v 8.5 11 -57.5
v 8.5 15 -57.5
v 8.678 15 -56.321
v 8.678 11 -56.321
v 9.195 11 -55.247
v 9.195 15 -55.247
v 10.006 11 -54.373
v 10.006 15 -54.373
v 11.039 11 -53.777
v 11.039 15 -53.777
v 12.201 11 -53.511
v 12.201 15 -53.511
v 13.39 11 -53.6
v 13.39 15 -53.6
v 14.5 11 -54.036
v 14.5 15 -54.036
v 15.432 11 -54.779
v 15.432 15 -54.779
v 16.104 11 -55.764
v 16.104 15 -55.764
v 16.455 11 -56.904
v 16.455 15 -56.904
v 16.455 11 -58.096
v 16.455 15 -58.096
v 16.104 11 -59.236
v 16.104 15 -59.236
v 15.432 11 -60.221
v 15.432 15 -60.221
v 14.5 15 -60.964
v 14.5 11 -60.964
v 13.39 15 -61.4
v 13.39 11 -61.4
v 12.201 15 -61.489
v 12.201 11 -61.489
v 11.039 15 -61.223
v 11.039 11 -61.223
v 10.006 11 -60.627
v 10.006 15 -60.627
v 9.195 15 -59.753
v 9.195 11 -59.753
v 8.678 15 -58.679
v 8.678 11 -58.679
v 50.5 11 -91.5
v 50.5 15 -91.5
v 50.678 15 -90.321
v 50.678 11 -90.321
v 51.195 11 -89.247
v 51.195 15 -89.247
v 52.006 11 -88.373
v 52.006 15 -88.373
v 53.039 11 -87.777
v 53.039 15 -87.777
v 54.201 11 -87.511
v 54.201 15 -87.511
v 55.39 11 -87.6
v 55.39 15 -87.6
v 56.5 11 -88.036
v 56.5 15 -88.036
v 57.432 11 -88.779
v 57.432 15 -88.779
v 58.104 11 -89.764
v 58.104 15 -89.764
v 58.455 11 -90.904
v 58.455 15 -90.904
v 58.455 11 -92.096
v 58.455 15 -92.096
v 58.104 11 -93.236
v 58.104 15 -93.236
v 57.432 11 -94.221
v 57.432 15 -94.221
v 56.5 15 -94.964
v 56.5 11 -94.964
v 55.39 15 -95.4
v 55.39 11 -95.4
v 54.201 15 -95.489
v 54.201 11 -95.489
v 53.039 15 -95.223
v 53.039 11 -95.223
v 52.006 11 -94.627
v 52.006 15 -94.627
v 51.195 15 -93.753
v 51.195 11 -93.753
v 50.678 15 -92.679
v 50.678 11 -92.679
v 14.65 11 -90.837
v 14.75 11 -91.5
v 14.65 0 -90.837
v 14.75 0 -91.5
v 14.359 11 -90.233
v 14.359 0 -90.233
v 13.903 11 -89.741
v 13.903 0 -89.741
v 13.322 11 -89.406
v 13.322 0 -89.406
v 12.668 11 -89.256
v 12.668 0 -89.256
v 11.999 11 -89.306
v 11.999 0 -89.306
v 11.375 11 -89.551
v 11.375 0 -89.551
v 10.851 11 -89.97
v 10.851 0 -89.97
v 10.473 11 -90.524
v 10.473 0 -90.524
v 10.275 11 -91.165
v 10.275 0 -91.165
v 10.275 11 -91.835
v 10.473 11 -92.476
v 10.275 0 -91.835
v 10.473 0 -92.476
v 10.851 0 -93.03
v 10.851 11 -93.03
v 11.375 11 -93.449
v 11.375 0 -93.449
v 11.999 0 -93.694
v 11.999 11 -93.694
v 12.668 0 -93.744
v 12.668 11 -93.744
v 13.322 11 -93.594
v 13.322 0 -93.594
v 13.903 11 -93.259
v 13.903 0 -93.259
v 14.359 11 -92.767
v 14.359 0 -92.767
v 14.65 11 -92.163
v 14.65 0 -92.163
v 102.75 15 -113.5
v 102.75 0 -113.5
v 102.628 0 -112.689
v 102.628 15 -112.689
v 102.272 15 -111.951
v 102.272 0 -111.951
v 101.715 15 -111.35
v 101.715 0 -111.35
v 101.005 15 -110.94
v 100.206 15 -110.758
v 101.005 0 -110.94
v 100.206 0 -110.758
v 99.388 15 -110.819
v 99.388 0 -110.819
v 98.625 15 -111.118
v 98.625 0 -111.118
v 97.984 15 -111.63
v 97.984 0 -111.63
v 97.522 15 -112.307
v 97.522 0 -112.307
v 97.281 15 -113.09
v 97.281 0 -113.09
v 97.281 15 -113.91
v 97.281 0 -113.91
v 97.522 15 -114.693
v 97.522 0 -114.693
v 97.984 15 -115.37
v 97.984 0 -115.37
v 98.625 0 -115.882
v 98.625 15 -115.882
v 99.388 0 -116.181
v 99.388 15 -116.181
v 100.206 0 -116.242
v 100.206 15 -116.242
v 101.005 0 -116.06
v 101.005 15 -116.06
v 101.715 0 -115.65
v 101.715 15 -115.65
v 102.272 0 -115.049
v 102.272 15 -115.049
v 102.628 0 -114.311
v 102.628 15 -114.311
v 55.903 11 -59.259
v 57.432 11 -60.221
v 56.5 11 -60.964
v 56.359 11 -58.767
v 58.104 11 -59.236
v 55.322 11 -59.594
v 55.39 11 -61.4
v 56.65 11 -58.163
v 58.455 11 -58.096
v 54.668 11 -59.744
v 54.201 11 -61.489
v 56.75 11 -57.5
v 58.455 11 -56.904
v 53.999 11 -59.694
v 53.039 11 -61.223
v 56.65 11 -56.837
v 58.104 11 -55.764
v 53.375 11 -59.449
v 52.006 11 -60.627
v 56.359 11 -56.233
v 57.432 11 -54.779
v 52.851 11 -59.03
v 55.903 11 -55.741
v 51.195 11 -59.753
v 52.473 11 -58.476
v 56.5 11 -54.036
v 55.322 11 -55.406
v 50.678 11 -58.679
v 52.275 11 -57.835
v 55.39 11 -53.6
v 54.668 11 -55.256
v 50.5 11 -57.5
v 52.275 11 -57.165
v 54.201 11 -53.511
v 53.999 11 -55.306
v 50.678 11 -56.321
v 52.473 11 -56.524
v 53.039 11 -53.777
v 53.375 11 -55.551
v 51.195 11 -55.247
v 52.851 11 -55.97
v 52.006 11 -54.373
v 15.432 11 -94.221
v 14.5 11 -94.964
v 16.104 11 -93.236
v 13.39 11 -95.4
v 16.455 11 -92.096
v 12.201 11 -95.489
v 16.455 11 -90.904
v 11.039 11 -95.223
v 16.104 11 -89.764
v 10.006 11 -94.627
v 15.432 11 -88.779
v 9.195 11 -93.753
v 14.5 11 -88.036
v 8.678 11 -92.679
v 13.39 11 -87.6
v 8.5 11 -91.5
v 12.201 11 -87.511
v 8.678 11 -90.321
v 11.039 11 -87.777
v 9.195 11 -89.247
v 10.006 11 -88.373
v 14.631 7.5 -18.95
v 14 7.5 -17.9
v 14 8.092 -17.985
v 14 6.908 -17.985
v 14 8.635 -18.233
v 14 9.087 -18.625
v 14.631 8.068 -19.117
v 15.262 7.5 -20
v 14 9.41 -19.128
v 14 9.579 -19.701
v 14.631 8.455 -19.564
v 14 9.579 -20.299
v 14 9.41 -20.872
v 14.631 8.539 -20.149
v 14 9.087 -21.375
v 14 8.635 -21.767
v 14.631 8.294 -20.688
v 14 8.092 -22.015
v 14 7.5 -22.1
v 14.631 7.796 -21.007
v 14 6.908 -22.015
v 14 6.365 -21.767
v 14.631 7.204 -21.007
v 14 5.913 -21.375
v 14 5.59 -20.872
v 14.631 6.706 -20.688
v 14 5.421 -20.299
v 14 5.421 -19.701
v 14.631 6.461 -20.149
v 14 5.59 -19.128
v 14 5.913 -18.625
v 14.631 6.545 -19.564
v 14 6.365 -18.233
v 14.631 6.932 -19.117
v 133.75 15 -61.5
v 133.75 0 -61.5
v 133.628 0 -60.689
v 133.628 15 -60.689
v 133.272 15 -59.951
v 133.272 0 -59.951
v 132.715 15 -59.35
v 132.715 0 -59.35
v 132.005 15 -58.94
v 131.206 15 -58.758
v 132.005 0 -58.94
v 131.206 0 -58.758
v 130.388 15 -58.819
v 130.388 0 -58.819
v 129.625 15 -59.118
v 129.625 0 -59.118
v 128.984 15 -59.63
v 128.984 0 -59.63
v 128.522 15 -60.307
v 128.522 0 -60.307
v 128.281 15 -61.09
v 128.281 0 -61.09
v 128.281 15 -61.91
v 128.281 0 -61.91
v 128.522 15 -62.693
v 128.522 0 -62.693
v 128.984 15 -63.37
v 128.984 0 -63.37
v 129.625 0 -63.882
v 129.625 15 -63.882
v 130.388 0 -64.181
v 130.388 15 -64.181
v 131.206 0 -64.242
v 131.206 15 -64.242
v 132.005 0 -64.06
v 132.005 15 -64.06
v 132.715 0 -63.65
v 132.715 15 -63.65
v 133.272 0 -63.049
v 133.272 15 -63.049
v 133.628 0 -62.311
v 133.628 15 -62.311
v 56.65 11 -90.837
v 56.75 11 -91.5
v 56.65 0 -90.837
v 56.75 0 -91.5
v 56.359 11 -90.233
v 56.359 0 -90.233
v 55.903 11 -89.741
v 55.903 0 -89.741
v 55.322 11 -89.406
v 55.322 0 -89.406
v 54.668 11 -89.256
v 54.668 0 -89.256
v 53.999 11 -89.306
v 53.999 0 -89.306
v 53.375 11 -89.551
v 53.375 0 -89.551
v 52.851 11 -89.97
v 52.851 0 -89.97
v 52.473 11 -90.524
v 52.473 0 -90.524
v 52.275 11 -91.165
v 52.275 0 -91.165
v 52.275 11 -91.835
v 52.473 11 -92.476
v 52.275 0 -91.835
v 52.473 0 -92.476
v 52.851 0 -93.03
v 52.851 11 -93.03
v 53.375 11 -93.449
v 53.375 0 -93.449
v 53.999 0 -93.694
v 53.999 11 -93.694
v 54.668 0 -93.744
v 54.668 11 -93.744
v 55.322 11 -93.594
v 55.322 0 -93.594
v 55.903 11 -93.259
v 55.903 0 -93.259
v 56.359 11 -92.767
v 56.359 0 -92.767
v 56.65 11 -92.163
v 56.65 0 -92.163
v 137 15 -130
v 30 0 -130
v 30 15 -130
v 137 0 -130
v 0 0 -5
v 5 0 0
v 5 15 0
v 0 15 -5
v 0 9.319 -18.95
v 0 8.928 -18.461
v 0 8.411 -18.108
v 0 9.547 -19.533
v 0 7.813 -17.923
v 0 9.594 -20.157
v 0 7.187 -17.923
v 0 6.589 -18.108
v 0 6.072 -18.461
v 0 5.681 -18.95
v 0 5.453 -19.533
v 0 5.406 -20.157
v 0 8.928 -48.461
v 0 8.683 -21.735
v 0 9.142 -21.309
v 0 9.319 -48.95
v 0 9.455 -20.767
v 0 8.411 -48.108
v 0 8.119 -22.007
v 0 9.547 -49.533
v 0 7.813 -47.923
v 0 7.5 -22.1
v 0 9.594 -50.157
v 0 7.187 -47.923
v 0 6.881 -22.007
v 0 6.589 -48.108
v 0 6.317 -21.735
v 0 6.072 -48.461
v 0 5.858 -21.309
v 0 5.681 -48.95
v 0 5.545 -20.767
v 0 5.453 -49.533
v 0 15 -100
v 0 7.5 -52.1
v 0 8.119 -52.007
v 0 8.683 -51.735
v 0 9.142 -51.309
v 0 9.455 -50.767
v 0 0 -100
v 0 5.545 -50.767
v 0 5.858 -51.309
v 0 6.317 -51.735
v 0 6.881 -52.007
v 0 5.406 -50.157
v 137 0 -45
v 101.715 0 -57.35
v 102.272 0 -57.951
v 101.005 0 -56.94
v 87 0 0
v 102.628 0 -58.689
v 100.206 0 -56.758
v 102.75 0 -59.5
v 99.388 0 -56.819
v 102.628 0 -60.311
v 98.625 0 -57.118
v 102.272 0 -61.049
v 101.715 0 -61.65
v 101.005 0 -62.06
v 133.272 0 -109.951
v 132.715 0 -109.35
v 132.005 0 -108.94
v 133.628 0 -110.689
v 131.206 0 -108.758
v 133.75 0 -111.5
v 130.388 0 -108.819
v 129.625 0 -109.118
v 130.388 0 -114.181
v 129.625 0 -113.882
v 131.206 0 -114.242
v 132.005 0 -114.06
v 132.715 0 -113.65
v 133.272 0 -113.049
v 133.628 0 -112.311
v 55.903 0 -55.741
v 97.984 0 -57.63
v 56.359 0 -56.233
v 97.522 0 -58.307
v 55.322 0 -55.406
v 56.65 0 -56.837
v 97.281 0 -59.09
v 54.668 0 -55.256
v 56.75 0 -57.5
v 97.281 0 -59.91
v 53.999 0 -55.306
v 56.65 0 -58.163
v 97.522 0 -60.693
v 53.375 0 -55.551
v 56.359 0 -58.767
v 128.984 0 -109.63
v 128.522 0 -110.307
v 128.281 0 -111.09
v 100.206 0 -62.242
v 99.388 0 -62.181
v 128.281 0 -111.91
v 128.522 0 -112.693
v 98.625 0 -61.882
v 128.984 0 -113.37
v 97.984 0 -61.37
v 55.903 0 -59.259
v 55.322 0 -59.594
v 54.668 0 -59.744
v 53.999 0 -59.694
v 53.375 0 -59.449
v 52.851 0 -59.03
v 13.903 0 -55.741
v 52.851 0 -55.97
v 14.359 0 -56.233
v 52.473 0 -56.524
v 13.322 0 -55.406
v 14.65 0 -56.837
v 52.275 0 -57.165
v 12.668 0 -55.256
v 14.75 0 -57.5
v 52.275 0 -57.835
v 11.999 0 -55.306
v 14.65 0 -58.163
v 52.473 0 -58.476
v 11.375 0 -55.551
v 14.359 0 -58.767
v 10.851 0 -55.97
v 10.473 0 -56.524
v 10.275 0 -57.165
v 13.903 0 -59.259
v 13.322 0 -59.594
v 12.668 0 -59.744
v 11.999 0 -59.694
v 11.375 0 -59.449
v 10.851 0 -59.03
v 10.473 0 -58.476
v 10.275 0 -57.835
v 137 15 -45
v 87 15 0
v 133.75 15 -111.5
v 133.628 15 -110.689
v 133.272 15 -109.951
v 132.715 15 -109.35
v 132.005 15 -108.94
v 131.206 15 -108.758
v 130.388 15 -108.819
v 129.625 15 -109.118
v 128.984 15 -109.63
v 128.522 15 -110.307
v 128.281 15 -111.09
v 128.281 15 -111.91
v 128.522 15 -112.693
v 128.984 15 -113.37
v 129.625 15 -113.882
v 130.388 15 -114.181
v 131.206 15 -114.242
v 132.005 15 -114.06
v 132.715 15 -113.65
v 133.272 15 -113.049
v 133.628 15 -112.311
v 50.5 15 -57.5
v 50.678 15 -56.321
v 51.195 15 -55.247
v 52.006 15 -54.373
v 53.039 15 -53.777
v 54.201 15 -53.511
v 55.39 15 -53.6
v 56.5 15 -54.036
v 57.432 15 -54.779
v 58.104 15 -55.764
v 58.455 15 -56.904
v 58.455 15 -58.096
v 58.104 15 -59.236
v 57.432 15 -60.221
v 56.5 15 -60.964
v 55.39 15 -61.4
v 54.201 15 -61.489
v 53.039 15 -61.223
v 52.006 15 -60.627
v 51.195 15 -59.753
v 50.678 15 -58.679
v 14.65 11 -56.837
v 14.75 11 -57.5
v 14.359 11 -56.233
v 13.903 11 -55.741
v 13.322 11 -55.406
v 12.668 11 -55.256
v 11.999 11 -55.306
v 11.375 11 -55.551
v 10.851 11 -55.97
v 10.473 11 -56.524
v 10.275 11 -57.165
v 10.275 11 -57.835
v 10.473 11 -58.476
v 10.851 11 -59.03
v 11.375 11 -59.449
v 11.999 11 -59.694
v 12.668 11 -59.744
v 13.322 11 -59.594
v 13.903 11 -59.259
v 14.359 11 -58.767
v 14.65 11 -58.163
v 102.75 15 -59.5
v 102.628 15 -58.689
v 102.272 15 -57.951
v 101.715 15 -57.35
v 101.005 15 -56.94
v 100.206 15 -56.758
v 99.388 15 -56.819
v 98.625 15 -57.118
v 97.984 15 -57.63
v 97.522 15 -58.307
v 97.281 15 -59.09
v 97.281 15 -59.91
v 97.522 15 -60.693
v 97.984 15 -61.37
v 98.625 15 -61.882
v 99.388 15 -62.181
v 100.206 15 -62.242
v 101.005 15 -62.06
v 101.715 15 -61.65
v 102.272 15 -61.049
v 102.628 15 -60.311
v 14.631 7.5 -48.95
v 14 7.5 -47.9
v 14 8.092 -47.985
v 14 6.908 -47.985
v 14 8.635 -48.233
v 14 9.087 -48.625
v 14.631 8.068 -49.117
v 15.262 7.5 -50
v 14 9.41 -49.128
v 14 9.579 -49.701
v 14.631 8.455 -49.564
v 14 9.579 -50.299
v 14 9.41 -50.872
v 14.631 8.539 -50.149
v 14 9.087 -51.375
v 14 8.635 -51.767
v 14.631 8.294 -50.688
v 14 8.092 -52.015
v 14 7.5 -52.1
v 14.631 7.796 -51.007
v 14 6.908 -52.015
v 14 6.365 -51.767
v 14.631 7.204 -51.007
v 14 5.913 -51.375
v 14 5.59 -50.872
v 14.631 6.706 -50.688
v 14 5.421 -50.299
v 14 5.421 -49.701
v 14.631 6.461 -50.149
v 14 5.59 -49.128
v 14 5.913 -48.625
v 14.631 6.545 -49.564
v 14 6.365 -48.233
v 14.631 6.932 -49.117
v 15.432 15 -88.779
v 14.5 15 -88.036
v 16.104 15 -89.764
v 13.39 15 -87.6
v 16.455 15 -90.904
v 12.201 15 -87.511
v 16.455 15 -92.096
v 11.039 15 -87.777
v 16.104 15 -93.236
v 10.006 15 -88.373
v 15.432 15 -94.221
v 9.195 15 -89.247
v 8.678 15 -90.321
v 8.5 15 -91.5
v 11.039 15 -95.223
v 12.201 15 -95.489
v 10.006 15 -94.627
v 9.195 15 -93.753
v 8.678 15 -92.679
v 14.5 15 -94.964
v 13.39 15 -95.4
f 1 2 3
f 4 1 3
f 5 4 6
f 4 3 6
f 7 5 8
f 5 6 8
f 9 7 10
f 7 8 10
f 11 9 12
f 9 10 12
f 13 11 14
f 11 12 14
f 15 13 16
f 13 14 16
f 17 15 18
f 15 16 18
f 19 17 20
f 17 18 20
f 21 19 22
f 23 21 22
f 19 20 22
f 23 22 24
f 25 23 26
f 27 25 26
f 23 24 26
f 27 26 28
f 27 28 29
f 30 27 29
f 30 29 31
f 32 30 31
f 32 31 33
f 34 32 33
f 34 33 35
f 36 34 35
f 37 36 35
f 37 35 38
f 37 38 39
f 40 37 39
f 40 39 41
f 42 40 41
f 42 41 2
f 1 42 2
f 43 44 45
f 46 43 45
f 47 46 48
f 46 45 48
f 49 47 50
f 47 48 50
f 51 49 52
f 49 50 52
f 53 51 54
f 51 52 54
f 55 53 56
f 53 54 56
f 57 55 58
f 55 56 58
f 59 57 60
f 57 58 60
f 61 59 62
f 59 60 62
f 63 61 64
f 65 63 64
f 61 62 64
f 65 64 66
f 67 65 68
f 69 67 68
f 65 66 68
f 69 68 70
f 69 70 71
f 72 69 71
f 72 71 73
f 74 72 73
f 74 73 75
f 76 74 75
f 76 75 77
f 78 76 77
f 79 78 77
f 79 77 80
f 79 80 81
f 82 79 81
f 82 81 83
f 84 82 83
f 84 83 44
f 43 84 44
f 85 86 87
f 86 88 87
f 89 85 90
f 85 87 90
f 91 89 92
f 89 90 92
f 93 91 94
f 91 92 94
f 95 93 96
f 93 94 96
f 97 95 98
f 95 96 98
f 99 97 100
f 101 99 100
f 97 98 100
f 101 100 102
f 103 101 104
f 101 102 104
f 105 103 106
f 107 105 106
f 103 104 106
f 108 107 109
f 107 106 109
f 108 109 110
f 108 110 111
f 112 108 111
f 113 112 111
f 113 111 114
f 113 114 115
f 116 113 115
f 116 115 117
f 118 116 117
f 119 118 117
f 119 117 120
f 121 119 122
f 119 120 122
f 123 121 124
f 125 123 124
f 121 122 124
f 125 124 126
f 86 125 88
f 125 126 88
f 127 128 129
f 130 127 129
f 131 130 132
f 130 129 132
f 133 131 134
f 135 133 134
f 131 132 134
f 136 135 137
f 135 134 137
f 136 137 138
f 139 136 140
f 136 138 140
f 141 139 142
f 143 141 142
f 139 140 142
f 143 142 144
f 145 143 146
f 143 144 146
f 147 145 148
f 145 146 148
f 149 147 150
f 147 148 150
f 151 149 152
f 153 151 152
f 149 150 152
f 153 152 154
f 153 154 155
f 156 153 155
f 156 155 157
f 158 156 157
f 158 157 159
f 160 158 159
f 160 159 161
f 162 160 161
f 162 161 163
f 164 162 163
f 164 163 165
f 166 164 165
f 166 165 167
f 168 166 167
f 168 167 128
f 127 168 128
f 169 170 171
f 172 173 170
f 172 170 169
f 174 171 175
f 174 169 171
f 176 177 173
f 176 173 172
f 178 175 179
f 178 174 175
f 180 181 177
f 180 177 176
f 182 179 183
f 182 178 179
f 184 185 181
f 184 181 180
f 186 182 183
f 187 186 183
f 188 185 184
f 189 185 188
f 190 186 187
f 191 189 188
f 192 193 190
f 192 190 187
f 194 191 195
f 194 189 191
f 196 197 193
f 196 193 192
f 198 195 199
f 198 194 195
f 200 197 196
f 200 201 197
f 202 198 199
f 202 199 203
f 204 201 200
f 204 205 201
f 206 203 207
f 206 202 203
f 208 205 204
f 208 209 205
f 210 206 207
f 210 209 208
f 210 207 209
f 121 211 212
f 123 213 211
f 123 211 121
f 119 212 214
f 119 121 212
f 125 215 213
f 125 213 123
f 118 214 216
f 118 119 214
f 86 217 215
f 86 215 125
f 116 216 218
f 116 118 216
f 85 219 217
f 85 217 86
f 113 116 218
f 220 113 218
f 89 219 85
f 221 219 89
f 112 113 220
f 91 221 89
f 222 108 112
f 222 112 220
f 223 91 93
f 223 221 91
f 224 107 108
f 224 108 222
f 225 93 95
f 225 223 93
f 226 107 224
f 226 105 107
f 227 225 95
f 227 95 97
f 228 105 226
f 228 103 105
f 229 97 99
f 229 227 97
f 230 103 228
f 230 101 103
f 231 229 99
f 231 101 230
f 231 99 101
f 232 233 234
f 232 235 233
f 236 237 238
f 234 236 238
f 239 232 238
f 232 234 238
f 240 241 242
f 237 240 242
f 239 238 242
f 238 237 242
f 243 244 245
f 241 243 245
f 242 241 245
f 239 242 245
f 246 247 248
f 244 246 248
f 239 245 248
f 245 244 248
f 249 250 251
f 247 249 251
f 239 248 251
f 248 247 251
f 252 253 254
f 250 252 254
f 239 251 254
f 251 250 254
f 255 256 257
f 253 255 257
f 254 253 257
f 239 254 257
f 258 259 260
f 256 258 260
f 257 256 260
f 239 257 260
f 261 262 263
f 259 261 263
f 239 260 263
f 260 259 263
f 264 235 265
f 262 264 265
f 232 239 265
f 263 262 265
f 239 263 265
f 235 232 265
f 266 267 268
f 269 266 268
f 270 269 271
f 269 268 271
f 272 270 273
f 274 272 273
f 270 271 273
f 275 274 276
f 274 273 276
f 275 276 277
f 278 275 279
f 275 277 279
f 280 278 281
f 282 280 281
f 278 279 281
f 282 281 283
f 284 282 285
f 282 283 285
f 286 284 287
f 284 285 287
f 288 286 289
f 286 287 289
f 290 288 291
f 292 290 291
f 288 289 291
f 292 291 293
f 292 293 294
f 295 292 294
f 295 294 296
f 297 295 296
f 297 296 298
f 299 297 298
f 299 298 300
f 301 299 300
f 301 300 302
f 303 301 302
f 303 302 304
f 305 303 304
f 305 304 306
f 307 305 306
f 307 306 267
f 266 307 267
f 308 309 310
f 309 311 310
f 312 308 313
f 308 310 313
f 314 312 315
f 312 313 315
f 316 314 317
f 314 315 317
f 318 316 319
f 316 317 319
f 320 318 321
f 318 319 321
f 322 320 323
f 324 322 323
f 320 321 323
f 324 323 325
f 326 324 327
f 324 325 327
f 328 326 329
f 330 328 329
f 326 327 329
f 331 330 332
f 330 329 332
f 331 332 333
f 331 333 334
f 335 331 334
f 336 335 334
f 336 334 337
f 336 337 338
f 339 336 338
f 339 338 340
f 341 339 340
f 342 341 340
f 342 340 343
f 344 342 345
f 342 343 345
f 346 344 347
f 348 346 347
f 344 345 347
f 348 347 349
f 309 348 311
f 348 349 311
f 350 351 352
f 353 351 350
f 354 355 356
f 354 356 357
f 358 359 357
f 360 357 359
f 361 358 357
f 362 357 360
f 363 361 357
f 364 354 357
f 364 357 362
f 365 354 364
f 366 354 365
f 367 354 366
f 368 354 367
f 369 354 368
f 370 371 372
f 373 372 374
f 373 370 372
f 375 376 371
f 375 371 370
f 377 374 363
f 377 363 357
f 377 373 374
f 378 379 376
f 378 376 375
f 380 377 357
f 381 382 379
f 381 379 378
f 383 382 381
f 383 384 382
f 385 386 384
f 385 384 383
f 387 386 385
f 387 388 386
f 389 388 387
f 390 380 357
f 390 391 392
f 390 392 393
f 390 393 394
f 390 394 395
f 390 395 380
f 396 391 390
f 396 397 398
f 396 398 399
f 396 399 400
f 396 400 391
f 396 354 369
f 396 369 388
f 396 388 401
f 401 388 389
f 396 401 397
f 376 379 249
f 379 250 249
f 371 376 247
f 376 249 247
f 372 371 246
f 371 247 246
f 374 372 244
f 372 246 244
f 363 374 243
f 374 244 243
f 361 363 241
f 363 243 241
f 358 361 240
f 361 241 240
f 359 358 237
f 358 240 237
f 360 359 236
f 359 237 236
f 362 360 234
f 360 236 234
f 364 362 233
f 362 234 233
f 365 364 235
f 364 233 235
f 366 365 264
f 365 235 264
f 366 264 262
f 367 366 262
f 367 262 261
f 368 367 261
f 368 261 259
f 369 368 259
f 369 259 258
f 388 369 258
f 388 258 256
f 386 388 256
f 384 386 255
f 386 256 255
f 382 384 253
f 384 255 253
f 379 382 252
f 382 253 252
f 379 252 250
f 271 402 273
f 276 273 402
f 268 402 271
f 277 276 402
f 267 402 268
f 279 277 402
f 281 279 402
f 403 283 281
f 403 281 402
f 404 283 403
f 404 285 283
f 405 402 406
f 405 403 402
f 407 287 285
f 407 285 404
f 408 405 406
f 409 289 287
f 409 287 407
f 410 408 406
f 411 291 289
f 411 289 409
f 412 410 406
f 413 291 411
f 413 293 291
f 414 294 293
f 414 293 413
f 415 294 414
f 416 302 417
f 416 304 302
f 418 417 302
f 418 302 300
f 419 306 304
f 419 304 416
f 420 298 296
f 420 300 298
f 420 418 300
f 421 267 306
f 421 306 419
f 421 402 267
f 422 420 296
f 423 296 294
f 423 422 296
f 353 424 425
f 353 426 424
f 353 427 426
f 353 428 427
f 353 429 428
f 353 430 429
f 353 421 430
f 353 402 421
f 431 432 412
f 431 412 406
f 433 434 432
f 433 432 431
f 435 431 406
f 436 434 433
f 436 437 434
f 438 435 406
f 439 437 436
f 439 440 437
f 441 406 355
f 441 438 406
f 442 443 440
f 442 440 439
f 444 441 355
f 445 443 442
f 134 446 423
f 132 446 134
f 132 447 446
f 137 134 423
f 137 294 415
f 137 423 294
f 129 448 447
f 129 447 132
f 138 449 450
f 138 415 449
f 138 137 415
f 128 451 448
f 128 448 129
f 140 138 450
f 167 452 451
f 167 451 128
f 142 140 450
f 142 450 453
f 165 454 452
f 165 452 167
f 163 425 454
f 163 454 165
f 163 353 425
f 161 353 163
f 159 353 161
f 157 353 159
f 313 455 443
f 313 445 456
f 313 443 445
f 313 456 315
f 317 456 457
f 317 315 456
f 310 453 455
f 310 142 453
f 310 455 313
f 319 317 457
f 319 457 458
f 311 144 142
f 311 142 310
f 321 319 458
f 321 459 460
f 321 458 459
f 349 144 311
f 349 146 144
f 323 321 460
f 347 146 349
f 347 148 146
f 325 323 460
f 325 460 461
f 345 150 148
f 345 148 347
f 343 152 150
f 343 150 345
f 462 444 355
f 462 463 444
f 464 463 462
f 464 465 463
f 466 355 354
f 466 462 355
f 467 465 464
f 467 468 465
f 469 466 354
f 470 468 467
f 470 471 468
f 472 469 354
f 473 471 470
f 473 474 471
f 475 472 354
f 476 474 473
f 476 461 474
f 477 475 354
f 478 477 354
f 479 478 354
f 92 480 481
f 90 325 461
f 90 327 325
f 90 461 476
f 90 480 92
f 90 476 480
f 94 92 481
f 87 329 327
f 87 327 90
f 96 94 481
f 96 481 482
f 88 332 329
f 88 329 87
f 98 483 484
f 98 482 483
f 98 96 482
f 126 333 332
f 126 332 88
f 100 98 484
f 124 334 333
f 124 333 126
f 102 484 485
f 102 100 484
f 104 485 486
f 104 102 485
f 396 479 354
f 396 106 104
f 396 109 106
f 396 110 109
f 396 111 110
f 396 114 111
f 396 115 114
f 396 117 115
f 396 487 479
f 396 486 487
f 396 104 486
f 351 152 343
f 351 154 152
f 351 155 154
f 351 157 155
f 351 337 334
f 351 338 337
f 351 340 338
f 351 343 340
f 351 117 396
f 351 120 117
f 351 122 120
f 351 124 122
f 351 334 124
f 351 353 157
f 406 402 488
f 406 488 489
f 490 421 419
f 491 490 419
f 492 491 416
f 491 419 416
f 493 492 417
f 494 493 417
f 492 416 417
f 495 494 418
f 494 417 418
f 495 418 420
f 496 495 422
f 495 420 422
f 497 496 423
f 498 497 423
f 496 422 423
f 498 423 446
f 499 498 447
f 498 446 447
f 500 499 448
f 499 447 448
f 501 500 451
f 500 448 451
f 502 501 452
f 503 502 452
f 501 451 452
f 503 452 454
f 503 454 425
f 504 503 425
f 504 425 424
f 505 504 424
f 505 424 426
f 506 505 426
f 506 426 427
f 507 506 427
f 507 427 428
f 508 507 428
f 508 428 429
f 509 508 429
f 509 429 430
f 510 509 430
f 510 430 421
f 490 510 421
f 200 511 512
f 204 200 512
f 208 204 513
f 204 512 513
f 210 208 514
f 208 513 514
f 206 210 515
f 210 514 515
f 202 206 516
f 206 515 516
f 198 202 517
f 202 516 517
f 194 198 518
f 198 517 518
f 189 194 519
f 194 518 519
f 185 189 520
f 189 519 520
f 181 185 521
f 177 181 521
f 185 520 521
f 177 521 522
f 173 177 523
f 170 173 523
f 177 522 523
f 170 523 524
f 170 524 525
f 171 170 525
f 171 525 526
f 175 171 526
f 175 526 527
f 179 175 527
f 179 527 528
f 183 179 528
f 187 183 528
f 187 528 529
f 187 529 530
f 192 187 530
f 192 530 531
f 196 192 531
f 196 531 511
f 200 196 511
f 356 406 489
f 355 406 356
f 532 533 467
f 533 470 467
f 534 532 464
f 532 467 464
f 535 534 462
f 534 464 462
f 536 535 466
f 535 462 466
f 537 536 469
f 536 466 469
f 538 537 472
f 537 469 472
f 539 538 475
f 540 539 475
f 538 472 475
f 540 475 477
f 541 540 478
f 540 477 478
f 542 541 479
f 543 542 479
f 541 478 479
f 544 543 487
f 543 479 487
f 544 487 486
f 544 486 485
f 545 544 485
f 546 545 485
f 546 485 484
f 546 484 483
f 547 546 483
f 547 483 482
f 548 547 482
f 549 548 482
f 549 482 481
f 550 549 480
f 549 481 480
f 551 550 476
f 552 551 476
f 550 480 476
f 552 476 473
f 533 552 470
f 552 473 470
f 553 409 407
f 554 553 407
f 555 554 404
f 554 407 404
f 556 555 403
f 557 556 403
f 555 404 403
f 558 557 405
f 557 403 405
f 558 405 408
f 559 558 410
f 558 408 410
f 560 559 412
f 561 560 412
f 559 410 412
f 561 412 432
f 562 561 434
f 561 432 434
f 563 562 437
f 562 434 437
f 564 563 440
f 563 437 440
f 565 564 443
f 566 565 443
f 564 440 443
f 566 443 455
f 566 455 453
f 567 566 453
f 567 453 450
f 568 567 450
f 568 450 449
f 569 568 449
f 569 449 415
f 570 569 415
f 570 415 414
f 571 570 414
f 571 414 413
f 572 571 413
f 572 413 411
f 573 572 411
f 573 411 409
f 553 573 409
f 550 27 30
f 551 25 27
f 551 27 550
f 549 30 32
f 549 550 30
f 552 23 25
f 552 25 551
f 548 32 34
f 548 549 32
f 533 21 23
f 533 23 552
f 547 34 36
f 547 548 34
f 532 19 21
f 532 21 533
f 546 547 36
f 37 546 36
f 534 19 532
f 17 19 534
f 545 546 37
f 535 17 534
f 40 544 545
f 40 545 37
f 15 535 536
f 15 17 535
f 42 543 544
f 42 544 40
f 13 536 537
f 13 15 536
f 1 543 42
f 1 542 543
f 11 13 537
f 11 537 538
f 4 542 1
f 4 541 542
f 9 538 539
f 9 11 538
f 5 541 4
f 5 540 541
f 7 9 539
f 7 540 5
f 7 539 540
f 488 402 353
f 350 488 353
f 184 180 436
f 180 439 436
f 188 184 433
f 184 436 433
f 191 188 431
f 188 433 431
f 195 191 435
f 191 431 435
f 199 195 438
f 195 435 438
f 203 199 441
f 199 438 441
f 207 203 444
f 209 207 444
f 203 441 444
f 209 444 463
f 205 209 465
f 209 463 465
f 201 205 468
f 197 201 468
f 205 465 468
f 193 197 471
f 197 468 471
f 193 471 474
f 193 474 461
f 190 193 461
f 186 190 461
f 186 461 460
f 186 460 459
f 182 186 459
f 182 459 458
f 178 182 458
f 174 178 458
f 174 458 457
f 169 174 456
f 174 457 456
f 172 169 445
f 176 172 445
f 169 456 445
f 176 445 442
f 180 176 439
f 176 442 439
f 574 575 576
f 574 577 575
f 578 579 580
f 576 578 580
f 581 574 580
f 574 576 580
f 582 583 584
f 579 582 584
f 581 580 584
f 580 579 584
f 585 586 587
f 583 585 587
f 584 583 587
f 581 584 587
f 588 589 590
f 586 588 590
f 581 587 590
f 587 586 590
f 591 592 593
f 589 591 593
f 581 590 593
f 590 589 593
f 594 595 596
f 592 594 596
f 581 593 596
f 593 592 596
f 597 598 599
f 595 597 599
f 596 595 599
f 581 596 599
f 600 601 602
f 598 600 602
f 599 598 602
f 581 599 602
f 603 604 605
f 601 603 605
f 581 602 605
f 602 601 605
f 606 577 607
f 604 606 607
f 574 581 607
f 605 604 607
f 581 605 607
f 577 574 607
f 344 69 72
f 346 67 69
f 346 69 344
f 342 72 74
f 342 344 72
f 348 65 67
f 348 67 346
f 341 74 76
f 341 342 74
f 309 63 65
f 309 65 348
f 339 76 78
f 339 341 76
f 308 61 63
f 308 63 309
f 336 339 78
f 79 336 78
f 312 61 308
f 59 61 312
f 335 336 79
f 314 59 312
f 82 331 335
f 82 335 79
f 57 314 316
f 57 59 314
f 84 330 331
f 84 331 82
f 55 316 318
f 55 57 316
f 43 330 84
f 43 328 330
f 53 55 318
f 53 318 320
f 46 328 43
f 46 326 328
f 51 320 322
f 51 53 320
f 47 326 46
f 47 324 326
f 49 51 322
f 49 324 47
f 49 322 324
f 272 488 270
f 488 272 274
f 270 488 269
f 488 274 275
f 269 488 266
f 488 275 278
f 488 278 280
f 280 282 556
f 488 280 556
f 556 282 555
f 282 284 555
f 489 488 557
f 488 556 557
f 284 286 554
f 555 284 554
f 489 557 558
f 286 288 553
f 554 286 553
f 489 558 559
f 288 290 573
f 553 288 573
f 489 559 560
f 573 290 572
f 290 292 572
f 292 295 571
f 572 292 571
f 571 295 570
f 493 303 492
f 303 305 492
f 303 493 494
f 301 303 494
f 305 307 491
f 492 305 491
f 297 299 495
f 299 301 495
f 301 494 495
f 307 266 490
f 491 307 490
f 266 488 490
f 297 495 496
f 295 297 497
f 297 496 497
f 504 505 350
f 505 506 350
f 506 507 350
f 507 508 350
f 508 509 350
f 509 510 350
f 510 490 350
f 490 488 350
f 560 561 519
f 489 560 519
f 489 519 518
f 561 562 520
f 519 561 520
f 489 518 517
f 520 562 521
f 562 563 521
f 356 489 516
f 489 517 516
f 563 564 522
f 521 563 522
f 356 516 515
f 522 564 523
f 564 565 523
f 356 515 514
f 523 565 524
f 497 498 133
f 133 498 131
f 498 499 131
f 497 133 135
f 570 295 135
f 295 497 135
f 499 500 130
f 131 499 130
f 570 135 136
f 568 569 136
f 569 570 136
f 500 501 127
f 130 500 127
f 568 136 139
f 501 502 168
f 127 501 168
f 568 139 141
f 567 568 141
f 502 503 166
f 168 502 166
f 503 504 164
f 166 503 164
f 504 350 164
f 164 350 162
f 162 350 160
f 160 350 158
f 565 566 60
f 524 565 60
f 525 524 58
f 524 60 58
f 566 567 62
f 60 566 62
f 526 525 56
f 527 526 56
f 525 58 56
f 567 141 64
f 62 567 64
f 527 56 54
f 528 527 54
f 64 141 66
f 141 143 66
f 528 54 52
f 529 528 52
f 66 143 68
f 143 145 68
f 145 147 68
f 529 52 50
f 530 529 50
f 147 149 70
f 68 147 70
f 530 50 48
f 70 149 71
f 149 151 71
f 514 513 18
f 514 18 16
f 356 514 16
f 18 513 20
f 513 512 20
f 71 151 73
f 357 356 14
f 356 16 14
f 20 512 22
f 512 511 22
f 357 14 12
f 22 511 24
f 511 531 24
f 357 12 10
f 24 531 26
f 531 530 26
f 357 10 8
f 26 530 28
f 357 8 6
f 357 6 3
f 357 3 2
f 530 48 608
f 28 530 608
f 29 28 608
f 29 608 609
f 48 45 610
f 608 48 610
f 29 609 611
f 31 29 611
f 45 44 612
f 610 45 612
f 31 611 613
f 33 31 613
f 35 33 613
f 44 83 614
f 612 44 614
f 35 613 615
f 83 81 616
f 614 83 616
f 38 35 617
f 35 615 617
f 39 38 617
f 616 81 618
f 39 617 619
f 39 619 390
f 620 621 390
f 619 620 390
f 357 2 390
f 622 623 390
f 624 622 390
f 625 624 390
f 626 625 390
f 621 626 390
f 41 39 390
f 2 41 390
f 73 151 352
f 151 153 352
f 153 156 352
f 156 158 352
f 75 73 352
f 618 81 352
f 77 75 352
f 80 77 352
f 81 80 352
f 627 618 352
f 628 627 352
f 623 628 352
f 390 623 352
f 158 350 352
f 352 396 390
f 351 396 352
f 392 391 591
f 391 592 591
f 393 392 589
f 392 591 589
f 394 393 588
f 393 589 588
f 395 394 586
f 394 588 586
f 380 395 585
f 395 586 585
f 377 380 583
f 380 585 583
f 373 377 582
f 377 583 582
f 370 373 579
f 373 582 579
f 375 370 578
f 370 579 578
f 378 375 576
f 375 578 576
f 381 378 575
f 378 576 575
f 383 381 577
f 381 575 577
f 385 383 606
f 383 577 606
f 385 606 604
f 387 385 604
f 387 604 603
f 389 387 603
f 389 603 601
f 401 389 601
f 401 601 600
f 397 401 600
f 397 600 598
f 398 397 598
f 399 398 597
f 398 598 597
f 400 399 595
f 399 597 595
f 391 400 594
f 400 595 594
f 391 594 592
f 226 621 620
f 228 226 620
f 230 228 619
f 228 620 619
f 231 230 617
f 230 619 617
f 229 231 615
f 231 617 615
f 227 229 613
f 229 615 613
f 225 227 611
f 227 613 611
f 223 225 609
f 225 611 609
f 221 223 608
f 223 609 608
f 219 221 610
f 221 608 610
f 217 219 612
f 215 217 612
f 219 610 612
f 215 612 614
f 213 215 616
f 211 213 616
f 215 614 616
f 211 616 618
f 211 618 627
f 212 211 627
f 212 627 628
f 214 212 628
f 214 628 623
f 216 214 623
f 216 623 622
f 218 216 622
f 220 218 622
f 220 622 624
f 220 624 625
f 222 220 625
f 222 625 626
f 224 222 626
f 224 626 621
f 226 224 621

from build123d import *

# Parameters (mm, degrees)
BOSS_EXTRUDE1_DEPTH                             = 15
M5_CLEARANCE_HOLE1_D                            = 5.5
M5_CLEARANCE_HOLE2_D                            = 5.5
CBORE_FOR_M4_SOCKET_HEAD_CAP_SCREW1_D           = 4.5
CBORE_FOR_M4_SOCKET_HEAD_CAP_SCREW1_CBORE_D     = 8
CBORE_FOR_M4_SOCKET_HEAD_CAP_SCREW1_CBORE_DEPTH = 4
HOLE_WIZARD_M51_D                               = 4.2
HOLE_WIZARD_M51_DEPTH                           = 14
HOLE_WIZARD_M51_TIP                             = 1.2618073


with BuildPart() as part:
    # Sketch1 → Boss-Extrude1 (new body)
    with BuildSketch(Plane(origin=(0, 0, 0), x_dir=(1, 0, 0), z_dir=(0, 1, 0))):
        Polygon((0, 100), (30, 130), (137, 130), (137, 120), (137, 45), (87, 0), (5, 0), (0, 5), align=None)
    extrude(amount=BOSS_EXTRUDE1_DEPTH)

    # M5 Clearance Hole1 (through all)
    with Locations(Plane(origin=(0, 15, 0), x_dir=(-1, 0, 0), z_dir=(0, 1, 0))):
        with Locations((-100, -59.5), (-100, -113.5)):
            Hole(M5_CLEARANCE_HOLE1_D / 2)

    # M5 Clearance Hole2 (through all)
    with Locations(Plane(origin=(0, 15, 0), x_dir=(-1, 0, 0), z_dir=(0, 1, 0))):
        with Locations((-131, -111.5), (-131, -61.5)):
            Hole(M5_CLEARANCE_HOLE2_D / 2)

    # CBORE for M4 Socket Head Cap Screw1 (through all)
    with Locations(Plane(origin=(0, 15, 0), x_dir=(-1, 0, 0), z_dir=(0, 1, 0))):
        with Locations((-12.5, -91.5), (-12.5, -57.5), (-54.5, -57.5), (-54.5, -91.5)):
            CounterBoreHole(CBORE_FOR_M4_SOCKET_HEAD_CAP_SCREW1_D / 2, CBORE_FOR_M4_SOCKET_HEAD_CAP_SCREW1_CBORE_D / 2, CBORE_FOR_M4_SOCKET_HEAD_CAP_SCREW1_CBORE_DEPTH)

    # Отверстие обработанное метчиком M51
    with Locations(Plane.ZY):
        with Locations((-50, 7.5), (-20, 7.5)):
            Hole(HOLE_WIZARD_M51_D / 2, depth=HOLE_WIZARD_M51_DEPTH)
            with Locations((0, 0, -(HOLE_WIZARD_M51_DEPTH + HOLE_WIZARD_M51_TIP / 2))):  # 118° drill point
                Cone(0, HOLE_WIZARD_M51_D / 2, HOLE_WIZARD_M51_TIP, mode=Mode.SUBTRACT)


solid = part.part
